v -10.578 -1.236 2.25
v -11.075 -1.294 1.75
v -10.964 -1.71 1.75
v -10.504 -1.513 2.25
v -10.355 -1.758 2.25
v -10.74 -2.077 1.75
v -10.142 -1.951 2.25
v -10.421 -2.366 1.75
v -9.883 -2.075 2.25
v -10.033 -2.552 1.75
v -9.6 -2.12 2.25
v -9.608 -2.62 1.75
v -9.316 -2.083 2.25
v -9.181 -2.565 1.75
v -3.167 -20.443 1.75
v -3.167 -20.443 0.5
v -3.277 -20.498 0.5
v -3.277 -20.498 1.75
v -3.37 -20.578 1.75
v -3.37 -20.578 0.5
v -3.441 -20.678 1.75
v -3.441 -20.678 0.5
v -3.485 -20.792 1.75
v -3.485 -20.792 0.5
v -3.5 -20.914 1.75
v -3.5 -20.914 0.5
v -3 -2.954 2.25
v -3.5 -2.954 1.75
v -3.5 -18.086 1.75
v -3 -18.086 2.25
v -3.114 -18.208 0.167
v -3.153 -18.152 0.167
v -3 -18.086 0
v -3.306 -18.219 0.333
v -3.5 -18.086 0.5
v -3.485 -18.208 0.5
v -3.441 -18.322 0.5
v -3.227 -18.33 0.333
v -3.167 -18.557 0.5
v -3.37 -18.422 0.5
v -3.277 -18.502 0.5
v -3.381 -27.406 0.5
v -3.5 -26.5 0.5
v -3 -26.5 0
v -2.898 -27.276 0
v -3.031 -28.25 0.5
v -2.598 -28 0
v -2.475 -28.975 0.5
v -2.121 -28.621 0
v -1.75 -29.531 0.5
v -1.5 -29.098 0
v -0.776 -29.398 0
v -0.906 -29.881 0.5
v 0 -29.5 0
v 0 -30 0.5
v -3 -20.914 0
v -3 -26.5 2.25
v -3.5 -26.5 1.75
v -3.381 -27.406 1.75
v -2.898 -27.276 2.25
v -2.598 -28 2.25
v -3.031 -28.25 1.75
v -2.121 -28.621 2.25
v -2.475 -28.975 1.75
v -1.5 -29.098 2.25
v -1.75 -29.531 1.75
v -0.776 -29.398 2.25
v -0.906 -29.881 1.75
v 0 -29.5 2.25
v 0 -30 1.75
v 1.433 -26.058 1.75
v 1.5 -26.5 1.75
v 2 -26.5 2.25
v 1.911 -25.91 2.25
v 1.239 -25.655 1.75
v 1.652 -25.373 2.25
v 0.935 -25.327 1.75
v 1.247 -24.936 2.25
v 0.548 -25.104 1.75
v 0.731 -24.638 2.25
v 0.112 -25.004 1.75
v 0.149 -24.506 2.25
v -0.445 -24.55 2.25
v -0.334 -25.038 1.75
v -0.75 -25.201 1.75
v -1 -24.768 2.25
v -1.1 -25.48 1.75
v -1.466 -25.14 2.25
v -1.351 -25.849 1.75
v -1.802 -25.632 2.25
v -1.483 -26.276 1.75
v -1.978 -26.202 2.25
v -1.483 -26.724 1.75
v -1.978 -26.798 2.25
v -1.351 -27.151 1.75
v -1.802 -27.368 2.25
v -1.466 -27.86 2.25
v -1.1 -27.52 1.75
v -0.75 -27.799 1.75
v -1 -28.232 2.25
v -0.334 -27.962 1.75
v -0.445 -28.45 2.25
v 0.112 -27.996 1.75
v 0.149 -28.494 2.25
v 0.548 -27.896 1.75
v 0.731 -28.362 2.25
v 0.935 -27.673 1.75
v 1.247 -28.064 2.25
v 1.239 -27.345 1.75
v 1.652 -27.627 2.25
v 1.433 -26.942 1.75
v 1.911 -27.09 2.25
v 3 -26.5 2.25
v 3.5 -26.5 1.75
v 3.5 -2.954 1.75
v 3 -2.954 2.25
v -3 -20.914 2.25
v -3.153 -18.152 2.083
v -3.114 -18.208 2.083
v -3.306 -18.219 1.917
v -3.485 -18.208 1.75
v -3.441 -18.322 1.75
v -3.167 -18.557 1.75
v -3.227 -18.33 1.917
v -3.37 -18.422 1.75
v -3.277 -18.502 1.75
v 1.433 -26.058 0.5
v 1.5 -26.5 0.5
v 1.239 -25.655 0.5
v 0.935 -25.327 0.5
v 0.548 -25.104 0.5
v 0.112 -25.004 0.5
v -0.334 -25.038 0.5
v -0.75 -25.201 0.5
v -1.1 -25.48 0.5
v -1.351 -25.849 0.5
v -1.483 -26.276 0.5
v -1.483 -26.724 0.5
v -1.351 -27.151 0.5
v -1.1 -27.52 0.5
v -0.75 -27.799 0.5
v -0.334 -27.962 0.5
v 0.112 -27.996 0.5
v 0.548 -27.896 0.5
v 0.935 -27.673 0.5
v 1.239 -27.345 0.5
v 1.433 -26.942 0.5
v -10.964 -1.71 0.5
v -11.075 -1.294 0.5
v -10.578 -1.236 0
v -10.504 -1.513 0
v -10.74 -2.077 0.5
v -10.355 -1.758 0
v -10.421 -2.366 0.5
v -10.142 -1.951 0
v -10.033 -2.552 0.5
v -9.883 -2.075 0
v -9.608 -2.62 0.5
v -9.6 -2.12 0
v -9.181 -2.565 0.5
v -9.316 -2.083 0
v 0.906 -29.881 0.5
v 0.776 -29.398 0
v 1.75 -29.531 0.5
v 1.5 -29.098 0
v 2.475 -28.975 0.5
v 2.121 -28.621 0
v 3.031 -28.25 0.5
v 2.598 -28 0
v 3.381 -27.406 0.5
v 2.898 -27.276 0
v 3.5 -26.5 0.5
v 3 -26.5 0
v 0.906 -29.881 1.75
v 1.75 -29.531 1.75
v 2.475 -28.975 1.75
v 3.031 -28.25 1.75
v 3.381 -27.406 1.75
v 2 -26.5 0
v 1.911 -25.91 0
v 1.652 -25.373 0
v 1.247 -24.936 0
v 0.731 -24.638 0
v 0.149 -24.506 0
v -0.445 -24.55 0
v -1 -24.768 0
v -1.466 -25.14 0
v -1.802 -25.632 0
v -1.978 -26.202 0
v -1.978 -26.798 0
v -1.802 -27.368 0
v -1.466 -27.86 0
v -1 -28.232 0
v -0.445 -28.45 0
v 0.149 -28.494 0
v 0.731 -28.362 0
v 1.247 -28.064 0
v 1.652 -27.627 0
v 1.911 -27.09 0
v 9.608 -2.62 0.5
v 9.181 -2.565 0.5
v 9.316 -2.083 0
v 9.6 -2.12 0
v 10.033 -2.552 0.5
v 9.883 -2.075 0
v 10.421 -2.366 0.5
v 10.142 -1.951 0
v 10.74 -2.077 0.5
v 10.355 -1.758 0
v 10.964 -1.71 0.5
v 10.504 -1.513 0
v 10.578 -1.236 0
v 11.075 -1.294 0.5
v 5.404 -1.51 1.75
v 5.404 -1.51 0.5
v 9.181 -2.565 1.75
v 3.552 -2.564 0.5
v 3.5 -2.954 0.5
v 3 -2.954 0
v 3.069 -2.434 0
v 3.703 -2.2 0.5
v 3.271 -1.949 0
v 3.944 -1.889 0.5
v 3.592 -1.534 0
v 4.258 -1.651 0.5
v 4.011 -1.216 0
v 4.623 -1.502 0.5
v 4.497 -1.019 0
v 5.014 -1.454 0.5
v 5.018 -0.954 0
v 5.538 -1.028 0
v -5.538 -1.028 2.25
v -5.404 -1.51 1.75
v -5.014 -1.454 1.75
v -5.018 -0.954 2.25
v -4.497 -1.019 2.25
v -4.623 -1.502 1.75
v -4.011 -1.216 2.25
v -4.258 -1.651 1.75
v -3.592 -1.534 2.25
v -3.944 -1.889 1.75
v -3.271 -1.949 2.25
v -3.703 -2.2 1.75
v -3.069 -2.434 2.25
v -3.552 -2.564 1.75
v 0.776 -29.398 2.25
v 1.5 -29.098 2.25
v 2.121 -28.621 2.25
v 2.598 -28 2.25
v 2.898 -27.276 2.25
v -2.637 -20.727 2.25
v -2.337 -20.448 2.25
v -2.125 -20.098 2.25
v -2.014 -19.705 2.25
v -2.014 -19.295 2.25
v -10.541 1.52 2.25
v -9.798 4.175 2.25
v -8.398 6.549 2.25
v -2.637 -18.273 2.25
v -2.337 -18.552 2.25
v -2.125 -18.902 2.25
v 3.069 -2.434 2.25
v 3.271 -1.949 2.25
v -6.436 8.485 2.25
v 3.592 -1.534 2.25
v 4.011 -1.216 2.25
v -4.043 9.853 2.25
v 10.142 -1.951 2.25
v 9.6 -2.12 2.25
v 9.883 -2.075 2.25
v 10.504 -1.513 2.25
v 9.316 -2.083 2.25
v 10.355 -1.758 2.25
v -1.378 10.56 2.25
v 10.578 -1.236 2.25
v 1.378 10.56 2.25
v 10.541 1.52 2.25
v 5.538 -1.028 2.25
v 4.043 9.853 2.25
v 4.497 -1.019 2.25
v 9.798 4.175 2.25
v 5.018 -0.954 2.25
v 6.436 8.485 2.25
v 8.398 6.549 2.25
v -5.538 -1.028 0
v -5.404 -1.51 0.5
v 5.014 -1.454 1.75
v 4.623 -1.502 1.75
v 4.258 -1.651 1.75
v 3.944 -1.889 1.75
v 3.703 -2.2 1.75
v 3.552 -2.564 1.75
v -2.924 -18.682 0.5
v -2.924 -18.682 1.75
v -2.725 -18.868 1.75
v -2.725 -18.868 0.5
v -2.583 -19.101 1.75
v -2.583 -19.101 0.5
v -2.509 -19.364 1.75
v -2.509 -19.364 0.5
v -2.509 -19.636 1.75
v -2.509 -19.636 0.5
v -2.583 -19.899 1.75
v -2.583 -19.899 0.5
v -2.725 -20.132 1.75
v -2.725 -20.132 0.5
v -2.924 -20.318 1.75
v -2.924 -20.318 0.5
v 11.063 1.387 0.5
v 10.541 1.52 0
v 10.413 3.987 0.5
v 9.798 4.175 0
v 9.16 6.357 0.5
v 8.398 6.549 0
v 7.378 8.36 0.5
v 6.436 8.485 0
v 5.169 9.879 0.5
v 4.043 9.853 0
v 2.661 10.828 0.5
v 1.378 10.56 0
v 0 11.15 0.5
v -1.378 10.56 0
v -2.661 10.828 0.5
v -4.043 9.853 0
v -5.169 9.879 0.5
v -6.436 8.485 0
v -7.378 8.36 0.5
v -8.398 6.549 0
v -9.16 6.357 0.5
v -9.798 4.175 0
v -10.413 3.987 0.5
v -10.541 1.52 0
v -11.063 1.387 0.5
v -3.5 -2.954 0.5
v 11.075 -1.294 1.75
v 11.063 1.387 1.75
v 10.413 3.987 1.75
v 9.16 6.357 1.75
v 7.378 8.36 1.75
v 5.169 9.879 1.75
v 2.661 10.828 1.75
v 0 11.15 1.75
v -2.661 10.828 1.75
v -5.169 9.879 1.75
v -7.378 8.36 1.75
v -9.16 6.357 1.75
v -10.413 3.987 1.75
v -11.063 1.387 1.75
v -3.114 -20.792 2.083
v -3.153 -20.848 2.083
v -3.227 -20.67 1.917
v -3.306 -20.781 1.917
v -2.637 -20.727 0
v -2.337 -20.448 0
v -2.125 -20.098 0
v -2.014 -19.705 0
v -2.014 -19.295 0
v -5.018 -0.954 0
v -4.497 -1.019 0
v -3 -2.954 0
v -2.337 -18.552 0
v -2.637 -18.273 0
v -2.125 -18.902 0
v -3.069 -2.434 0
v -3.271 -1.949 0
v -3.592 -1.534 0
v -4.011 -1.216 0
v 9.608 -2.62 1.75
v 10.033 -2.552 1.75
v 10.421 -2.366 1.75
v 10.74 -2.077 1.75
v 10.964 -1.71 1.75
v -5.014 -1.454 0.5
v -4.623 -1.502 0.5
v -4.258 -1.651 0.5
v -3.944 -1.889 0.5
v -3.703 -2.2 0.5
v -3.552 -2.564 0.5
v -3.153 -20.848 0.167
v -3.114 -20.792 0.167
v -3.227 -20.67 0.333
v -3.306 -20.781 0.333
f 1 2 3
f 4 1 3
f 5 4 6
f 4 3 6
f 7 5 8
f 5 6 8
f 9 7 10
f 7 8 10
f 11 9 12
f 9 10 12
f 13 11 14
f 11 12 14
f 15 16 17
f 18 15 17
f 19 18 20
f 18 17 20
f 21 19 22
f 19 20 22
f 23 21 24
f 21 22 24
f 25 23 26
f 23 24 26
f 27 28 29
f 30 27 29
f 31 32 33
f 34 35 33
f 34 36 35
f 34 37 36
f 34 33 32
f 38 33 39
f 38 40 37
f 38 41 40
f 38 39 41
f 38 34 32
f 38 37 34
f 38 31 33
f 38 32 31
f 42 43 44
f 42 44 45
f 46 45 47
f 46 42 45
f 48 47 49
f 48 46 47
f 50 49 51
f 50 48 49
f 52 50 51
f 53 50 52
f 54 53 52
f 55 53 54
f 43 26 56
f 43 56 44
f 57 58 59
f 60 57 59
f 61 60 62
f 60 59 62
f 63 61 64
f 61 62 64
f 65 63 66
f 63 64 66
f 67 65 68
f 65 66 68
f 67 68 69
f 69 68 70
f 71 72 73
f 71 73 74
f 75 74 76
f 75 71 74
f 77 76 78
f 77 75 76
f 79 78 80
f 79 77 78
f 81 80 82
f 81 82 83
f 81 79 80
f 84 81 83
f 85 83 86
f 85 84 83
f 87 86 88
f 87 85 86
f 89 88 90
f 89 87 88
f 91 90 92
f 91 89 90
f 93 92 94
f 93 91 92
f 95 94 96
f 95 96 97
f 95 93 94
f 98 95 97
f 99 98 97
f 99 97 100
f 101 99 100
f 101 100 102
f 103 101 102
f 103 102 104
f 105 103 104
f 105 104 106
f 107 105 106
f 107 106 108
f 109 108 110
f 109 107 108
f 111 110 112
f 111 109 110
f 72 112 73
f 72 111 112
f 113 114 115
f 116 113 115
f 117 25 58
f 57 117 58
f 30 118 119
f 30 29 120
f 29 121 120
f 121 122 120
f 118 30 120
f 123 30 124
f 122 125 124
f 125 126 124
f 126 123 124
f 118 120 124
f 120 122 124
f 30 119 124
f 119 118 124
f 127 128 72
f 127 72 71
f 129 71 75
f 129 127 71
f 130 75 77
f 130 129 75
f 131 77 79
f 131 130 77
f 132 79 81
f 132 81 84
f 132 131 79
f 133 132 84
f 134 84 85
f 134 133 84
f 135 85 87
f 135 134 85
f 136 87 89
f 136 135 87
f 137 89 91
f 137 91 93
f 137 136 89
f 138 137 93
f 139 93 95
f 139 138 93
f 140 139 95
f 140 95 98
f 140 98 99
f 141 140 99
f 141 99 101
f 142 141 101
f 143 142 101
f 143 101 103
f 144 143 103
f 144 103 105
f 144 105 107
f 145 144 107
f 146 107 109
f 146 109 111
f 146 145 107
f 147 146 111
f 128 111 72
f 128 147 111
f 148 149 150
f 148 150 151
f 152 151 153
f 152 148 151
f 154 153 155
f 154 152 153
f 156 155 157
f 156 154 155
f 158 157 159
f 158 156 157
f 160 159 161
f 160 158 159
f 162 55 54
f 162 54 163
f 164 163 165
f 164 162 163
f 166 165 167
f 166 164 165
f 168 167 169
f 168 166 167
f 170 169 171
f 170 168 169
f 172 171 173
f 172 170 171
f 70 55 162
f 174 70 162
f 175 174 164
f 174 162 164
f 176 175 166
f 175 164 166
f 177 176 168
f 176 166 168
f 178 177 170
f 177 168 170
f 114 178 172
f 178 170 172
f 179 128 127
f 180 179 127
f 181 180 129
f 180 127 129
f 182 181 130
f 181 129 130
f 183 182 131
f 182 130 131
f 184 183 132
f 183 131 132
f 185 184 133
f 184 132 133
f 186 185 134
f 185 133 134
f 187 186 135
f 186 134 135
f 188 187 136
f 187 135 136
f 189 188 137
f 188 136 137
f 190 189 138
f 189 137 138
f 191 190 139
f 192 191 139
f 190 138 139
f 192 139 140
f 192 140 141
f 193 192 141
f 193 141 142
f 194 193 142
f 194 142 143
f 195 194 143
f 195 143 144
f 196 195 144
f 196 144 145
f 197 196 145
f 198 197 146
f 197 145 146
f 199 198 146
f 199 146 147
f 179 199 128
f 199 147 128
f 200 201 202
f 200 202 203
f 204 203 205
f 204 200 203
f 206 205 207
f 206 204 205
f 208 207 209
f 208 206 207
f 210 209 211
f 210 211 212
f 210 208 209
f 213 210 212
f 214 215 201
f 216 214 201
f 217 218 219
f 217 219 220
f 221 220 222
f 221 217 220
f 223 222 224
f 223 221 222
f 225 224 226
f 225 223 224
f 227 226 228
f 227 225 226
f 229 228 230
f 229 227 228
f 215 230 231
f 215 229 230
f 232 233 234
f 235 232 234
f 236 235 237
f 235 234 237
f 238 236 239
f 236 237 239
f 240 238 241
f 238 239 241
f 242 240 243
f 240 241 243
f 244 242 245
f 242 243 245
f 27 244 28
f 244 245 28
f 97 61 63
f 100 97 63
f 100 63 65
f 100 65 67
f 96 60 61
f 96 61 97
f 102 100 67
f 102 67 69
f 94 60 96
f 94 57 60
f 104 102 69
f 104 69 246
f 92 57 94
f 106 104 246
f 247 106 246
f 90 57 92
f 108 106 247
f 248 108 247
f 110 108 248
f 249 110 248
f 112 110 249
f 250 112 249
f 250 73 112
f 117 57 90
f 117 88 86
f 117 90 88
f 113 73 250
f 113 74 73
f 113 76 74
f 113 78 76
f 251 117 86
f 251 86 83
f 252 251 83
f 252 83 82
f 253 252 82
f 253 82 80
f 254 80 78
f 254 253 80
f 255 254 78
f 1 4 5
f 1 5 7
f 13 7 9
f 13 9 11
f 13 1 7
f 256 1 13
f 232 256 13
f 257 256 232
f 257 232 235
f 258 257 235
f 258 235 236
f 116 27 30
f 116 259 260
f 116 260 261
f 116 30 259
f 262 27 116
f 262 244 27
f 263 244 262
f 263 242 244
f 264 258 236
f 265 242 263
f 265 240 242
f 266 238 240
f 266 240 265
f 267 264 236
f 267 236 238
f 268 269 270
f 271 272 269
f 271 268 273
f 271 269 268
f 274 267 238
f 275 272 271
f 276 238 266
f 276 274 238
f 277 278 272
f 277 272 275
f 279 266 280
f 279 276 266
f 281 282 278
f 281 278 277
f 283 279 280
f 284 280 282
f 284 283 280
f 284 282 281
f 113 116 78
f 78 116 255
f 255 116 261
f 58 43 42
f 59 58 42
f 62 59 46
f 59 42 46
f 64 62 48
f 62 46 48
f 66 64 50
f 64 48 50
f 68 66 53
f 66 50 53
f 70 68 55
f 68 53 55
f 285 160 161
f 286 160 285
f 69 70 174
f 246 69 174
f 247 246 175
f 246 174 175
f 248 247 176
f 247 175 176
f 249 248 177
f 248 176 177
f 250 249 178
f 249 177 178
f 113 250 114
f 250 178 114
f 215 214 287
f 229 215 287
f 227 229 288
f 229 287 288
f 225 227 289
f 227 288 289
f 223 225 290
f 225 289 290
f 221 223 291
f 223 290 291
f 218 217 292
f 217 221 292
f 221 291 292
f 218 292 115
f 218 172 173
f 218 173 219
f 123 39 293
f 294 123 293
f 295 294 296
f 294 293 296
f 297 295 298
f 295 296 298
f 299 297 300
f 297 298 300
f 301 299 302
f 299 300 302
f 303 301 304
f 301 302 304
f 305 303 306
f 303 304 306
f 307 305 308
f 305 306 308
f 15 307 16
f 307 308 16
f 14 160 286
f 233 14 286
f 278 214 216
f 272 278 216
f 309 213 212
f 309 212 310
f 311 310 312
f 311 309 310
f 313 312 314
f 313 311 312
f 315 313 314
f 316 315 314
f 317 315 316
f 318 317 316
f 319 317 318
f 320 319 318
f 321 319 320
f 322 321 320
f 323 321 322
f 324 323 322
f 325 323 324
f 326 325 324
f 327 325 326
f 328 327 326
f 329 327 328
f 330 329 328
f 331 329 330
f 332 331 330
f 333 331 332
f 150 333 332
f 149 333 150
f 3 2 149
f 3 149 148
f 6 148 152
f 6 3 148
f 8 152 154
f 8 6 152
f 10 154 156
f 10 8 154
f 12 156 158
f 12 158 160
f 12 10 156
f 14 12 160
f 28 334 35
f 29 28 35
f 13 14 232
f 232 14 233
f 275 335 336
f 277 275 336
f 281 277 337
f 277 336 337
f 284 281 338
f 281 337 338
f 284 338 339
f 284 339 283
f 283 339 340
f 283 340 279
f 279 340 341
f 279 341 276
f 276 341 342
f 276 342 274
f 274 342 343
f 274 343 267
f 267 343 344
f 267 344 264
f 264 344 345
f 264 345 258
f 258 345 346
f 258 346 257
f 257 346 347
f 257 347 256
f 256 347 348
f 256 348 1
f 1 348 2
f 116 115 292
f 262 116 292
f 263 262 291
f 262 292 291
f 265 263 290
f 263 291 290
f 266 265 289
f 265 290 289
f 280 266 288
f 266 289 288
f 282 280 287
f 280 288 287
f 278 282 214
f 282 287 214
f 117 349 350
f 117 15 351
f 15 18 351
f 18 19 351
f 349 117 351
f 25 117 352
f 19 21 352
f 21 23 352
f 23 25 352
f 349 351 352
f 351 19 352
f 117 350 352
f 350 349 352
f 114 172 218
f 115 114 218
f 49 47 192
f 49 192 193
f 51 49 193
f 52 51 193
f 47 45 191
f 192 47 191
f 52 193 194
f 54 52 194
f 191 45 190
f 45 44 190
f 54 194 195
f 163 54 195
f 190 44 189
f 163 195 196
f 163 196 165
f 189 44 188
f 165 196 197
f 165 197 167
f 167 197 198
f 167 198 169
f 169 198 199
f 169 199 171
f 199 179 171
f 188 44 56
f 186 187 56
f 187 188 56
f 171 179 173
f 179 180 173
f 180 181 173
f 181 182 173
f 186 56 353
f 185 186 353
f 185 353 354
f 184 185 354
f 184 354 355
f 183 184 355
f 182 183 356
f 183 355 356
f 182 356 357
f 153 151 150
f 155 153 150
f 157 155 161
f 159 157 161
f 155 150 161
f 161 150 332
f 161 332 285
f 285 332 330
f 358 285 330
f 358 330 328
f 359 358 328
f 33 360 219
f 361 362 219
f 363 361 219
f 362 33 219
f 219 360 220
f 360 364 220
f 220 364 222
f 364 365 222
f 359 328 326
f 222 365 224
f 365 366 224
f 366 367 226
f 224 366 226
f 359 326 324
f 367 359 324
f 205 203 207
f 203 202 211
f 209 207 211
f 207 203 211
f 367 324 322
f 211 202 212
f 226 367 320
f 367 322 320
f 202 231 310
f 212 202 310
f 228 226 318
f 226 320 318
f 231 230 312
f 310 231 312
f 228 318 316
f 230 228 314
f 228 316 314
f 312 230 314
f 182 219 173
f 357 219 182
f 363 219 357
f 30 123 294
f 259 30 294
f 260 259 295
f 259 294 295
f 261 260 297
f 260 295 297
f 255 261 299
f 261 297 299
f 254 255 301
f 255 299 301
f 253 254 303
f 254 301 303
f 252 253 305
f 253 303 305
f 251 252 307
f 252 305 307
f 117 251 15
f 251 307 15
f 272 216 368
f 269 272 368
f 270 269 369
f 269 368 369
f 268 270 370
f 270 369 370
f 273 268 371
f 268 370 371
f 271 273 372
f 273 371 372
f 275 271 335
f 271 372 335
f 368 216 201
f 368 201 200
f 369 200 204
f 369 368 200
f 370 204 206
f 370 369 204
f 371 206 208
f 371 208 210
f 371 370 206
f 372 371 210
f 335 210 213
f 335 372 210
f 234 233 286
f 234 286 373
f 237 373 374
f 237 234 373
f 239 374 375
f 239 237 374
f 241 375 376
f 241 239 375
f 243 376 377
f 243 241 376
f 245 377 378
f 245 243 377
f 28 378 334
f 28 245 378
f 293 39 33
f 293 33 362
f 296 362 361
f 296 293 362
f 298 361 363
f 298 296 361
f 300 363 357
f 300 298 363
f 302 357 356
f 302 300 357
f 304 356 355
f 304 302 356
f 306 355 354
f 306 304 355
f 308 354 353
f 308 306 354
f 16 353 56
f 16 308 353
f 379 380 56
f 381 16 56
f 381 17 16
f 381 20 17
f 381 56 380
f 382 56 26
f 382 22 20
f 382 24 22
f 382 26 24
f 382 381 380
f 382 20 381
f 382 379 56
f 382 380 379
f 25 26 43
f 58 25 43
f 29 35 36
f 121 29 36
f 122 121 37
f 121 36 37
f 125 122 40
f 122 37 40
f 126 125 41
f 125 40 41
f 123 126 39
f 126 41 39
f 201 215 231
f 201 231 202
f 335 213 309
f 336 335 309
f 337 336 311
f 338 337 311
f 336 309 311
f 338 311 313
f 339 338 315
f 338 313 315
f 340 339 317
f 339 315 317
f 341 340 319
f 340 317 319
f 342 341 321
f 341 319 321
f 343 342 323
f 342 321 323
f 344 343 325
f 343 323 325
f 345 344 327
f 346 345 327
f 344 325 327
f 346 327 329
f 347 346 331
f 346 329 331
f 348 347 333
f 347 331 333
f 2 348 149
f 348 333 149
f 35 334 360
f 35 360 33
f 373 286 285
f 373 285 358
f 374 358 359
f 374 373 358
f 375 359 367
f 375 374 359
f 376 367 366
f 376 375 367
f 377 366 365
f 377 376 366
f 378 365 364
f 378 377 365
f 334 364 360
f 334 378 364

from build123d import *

# Parameters (mm, degrees)
F0_R     = 1.5
F1_DEPTH = 2.25
F2_R     = 1.5
F3_SIZE  = 0.49999


# Not quite as in the source:
# - a fillet or chamfer is up to 0.001 mm smaller than in the source, because OpenCascade refuses the exact size


with BuildPart() as f1:
    # F0 (on Top) → F1 (new body)
    with BuildSketch(Plane.XY):
        with BuildLine():
            Line((3.5, -0.9777600189), (10.7388314076, -3))
            ThreePointArc((10.7388314076, -3), (0, 11.15), (-10.7388314076, -3))
            Line((-10.7388314076, -3), (-3.5, -0.9777600189))
            Line((-3.5, -0.9777600189), (-3.5, -18.0857864376))
            ThreePointArc((-3.5, -18.0857864376), (-3.4082482905, -18.3744615722), (-3.1666666667, -18.5571909584))
            ThreePointArc((-3.1666666667, -18.5571909584), (-2.5, -19.5), (-3.1666666667, -20.4428090416))
            ThreePointArc((-3.1666666667, -20.4428090416), (-3.4082482905, -20.6255384278), (-3.5, -20.9142135624))
            Line((-3.5, -20.9142135624), (-3.5, -26.5))
            ThreePointArc((-3.5, -26.5), (-2.4748737342, -28.9748737342), (0, -30))
            ThreePointArc((0, -30), (2.4748737342, -28.9748737342), (3.5, -26.5))
            Line((3.5, -26.5), (3.5, -0.9777600189))
        make_face()
        with Locations((0, -26.5)):
            Circle(F0_R, mode=Mode.SUBTRACT)
    extrude(amount=F1_DEPTH)

    # F2
    f2_edges = [f1.edges().sort_by_distance(p)[0] for p in [
        (10.738831, -3, 1.125),
        (-10.738831, -3, 1.125),
        (-3.5, -0.97776, 1.125),
        (3.5, -0.97776, 1.125),
    ]]
    fillet(f2_edges, radius=F2_R)

    # F3 (size 0.5 in the source; OpenCascade refuses exactly that, so slightly less here)
    f3_edges = [f1.edges().sort_by_distance(p)[0] for p in [
        (3.5, -14.727116, 2.25),
        (4.093187, -1.759372, 2.25),
        (0, -30, 2.25),
        (7.292383, -2.0372, 2.25),
        (-3.5, -23.707107, 2.25),
        (10.420577, -2.365727, 2.25),
        (-3.408248, -20.625538, 2.25),
        (0, 11.15, 2.25),
        (-2.5, -19.5, 2.25),
        (-10.420577, -2.365727, 2.25),
        (-3.408248, -18.374462, 2.25),
        (-7.292383, -2.0372, 2.25),
        (-3.5, -10.520009, 2.25),
        (-4.093187, -1.759372, 2.25),
        (-1.5, -26.5, 2.25),
        (3.5, -14.727116, 0),
        (4.093187, -1.759372, 0),
        (0, -30, 0),
        (7.292383, -2.0372, 0),
        (-3.5, -23.707107, 0),
        (10.420577, -2.365727, 0),
        (-3.408248, -20.625538, 0),
        (0, 11.15, 0),
        (-2.5, -19.5, 0),
        (-10.420577, -2.365727, 0),
        (-3.408248, -18.374462, 0),
        (-7.292383, -2.0372, 0),
        (-3.5, -10.520009, 0),
        (-4.093187, -1.759372, 0),
        (-1.5, -26.5, 0),
    ]]
    chamfer(f3_edges, length=F3_SIZE)


solid = f1.part
